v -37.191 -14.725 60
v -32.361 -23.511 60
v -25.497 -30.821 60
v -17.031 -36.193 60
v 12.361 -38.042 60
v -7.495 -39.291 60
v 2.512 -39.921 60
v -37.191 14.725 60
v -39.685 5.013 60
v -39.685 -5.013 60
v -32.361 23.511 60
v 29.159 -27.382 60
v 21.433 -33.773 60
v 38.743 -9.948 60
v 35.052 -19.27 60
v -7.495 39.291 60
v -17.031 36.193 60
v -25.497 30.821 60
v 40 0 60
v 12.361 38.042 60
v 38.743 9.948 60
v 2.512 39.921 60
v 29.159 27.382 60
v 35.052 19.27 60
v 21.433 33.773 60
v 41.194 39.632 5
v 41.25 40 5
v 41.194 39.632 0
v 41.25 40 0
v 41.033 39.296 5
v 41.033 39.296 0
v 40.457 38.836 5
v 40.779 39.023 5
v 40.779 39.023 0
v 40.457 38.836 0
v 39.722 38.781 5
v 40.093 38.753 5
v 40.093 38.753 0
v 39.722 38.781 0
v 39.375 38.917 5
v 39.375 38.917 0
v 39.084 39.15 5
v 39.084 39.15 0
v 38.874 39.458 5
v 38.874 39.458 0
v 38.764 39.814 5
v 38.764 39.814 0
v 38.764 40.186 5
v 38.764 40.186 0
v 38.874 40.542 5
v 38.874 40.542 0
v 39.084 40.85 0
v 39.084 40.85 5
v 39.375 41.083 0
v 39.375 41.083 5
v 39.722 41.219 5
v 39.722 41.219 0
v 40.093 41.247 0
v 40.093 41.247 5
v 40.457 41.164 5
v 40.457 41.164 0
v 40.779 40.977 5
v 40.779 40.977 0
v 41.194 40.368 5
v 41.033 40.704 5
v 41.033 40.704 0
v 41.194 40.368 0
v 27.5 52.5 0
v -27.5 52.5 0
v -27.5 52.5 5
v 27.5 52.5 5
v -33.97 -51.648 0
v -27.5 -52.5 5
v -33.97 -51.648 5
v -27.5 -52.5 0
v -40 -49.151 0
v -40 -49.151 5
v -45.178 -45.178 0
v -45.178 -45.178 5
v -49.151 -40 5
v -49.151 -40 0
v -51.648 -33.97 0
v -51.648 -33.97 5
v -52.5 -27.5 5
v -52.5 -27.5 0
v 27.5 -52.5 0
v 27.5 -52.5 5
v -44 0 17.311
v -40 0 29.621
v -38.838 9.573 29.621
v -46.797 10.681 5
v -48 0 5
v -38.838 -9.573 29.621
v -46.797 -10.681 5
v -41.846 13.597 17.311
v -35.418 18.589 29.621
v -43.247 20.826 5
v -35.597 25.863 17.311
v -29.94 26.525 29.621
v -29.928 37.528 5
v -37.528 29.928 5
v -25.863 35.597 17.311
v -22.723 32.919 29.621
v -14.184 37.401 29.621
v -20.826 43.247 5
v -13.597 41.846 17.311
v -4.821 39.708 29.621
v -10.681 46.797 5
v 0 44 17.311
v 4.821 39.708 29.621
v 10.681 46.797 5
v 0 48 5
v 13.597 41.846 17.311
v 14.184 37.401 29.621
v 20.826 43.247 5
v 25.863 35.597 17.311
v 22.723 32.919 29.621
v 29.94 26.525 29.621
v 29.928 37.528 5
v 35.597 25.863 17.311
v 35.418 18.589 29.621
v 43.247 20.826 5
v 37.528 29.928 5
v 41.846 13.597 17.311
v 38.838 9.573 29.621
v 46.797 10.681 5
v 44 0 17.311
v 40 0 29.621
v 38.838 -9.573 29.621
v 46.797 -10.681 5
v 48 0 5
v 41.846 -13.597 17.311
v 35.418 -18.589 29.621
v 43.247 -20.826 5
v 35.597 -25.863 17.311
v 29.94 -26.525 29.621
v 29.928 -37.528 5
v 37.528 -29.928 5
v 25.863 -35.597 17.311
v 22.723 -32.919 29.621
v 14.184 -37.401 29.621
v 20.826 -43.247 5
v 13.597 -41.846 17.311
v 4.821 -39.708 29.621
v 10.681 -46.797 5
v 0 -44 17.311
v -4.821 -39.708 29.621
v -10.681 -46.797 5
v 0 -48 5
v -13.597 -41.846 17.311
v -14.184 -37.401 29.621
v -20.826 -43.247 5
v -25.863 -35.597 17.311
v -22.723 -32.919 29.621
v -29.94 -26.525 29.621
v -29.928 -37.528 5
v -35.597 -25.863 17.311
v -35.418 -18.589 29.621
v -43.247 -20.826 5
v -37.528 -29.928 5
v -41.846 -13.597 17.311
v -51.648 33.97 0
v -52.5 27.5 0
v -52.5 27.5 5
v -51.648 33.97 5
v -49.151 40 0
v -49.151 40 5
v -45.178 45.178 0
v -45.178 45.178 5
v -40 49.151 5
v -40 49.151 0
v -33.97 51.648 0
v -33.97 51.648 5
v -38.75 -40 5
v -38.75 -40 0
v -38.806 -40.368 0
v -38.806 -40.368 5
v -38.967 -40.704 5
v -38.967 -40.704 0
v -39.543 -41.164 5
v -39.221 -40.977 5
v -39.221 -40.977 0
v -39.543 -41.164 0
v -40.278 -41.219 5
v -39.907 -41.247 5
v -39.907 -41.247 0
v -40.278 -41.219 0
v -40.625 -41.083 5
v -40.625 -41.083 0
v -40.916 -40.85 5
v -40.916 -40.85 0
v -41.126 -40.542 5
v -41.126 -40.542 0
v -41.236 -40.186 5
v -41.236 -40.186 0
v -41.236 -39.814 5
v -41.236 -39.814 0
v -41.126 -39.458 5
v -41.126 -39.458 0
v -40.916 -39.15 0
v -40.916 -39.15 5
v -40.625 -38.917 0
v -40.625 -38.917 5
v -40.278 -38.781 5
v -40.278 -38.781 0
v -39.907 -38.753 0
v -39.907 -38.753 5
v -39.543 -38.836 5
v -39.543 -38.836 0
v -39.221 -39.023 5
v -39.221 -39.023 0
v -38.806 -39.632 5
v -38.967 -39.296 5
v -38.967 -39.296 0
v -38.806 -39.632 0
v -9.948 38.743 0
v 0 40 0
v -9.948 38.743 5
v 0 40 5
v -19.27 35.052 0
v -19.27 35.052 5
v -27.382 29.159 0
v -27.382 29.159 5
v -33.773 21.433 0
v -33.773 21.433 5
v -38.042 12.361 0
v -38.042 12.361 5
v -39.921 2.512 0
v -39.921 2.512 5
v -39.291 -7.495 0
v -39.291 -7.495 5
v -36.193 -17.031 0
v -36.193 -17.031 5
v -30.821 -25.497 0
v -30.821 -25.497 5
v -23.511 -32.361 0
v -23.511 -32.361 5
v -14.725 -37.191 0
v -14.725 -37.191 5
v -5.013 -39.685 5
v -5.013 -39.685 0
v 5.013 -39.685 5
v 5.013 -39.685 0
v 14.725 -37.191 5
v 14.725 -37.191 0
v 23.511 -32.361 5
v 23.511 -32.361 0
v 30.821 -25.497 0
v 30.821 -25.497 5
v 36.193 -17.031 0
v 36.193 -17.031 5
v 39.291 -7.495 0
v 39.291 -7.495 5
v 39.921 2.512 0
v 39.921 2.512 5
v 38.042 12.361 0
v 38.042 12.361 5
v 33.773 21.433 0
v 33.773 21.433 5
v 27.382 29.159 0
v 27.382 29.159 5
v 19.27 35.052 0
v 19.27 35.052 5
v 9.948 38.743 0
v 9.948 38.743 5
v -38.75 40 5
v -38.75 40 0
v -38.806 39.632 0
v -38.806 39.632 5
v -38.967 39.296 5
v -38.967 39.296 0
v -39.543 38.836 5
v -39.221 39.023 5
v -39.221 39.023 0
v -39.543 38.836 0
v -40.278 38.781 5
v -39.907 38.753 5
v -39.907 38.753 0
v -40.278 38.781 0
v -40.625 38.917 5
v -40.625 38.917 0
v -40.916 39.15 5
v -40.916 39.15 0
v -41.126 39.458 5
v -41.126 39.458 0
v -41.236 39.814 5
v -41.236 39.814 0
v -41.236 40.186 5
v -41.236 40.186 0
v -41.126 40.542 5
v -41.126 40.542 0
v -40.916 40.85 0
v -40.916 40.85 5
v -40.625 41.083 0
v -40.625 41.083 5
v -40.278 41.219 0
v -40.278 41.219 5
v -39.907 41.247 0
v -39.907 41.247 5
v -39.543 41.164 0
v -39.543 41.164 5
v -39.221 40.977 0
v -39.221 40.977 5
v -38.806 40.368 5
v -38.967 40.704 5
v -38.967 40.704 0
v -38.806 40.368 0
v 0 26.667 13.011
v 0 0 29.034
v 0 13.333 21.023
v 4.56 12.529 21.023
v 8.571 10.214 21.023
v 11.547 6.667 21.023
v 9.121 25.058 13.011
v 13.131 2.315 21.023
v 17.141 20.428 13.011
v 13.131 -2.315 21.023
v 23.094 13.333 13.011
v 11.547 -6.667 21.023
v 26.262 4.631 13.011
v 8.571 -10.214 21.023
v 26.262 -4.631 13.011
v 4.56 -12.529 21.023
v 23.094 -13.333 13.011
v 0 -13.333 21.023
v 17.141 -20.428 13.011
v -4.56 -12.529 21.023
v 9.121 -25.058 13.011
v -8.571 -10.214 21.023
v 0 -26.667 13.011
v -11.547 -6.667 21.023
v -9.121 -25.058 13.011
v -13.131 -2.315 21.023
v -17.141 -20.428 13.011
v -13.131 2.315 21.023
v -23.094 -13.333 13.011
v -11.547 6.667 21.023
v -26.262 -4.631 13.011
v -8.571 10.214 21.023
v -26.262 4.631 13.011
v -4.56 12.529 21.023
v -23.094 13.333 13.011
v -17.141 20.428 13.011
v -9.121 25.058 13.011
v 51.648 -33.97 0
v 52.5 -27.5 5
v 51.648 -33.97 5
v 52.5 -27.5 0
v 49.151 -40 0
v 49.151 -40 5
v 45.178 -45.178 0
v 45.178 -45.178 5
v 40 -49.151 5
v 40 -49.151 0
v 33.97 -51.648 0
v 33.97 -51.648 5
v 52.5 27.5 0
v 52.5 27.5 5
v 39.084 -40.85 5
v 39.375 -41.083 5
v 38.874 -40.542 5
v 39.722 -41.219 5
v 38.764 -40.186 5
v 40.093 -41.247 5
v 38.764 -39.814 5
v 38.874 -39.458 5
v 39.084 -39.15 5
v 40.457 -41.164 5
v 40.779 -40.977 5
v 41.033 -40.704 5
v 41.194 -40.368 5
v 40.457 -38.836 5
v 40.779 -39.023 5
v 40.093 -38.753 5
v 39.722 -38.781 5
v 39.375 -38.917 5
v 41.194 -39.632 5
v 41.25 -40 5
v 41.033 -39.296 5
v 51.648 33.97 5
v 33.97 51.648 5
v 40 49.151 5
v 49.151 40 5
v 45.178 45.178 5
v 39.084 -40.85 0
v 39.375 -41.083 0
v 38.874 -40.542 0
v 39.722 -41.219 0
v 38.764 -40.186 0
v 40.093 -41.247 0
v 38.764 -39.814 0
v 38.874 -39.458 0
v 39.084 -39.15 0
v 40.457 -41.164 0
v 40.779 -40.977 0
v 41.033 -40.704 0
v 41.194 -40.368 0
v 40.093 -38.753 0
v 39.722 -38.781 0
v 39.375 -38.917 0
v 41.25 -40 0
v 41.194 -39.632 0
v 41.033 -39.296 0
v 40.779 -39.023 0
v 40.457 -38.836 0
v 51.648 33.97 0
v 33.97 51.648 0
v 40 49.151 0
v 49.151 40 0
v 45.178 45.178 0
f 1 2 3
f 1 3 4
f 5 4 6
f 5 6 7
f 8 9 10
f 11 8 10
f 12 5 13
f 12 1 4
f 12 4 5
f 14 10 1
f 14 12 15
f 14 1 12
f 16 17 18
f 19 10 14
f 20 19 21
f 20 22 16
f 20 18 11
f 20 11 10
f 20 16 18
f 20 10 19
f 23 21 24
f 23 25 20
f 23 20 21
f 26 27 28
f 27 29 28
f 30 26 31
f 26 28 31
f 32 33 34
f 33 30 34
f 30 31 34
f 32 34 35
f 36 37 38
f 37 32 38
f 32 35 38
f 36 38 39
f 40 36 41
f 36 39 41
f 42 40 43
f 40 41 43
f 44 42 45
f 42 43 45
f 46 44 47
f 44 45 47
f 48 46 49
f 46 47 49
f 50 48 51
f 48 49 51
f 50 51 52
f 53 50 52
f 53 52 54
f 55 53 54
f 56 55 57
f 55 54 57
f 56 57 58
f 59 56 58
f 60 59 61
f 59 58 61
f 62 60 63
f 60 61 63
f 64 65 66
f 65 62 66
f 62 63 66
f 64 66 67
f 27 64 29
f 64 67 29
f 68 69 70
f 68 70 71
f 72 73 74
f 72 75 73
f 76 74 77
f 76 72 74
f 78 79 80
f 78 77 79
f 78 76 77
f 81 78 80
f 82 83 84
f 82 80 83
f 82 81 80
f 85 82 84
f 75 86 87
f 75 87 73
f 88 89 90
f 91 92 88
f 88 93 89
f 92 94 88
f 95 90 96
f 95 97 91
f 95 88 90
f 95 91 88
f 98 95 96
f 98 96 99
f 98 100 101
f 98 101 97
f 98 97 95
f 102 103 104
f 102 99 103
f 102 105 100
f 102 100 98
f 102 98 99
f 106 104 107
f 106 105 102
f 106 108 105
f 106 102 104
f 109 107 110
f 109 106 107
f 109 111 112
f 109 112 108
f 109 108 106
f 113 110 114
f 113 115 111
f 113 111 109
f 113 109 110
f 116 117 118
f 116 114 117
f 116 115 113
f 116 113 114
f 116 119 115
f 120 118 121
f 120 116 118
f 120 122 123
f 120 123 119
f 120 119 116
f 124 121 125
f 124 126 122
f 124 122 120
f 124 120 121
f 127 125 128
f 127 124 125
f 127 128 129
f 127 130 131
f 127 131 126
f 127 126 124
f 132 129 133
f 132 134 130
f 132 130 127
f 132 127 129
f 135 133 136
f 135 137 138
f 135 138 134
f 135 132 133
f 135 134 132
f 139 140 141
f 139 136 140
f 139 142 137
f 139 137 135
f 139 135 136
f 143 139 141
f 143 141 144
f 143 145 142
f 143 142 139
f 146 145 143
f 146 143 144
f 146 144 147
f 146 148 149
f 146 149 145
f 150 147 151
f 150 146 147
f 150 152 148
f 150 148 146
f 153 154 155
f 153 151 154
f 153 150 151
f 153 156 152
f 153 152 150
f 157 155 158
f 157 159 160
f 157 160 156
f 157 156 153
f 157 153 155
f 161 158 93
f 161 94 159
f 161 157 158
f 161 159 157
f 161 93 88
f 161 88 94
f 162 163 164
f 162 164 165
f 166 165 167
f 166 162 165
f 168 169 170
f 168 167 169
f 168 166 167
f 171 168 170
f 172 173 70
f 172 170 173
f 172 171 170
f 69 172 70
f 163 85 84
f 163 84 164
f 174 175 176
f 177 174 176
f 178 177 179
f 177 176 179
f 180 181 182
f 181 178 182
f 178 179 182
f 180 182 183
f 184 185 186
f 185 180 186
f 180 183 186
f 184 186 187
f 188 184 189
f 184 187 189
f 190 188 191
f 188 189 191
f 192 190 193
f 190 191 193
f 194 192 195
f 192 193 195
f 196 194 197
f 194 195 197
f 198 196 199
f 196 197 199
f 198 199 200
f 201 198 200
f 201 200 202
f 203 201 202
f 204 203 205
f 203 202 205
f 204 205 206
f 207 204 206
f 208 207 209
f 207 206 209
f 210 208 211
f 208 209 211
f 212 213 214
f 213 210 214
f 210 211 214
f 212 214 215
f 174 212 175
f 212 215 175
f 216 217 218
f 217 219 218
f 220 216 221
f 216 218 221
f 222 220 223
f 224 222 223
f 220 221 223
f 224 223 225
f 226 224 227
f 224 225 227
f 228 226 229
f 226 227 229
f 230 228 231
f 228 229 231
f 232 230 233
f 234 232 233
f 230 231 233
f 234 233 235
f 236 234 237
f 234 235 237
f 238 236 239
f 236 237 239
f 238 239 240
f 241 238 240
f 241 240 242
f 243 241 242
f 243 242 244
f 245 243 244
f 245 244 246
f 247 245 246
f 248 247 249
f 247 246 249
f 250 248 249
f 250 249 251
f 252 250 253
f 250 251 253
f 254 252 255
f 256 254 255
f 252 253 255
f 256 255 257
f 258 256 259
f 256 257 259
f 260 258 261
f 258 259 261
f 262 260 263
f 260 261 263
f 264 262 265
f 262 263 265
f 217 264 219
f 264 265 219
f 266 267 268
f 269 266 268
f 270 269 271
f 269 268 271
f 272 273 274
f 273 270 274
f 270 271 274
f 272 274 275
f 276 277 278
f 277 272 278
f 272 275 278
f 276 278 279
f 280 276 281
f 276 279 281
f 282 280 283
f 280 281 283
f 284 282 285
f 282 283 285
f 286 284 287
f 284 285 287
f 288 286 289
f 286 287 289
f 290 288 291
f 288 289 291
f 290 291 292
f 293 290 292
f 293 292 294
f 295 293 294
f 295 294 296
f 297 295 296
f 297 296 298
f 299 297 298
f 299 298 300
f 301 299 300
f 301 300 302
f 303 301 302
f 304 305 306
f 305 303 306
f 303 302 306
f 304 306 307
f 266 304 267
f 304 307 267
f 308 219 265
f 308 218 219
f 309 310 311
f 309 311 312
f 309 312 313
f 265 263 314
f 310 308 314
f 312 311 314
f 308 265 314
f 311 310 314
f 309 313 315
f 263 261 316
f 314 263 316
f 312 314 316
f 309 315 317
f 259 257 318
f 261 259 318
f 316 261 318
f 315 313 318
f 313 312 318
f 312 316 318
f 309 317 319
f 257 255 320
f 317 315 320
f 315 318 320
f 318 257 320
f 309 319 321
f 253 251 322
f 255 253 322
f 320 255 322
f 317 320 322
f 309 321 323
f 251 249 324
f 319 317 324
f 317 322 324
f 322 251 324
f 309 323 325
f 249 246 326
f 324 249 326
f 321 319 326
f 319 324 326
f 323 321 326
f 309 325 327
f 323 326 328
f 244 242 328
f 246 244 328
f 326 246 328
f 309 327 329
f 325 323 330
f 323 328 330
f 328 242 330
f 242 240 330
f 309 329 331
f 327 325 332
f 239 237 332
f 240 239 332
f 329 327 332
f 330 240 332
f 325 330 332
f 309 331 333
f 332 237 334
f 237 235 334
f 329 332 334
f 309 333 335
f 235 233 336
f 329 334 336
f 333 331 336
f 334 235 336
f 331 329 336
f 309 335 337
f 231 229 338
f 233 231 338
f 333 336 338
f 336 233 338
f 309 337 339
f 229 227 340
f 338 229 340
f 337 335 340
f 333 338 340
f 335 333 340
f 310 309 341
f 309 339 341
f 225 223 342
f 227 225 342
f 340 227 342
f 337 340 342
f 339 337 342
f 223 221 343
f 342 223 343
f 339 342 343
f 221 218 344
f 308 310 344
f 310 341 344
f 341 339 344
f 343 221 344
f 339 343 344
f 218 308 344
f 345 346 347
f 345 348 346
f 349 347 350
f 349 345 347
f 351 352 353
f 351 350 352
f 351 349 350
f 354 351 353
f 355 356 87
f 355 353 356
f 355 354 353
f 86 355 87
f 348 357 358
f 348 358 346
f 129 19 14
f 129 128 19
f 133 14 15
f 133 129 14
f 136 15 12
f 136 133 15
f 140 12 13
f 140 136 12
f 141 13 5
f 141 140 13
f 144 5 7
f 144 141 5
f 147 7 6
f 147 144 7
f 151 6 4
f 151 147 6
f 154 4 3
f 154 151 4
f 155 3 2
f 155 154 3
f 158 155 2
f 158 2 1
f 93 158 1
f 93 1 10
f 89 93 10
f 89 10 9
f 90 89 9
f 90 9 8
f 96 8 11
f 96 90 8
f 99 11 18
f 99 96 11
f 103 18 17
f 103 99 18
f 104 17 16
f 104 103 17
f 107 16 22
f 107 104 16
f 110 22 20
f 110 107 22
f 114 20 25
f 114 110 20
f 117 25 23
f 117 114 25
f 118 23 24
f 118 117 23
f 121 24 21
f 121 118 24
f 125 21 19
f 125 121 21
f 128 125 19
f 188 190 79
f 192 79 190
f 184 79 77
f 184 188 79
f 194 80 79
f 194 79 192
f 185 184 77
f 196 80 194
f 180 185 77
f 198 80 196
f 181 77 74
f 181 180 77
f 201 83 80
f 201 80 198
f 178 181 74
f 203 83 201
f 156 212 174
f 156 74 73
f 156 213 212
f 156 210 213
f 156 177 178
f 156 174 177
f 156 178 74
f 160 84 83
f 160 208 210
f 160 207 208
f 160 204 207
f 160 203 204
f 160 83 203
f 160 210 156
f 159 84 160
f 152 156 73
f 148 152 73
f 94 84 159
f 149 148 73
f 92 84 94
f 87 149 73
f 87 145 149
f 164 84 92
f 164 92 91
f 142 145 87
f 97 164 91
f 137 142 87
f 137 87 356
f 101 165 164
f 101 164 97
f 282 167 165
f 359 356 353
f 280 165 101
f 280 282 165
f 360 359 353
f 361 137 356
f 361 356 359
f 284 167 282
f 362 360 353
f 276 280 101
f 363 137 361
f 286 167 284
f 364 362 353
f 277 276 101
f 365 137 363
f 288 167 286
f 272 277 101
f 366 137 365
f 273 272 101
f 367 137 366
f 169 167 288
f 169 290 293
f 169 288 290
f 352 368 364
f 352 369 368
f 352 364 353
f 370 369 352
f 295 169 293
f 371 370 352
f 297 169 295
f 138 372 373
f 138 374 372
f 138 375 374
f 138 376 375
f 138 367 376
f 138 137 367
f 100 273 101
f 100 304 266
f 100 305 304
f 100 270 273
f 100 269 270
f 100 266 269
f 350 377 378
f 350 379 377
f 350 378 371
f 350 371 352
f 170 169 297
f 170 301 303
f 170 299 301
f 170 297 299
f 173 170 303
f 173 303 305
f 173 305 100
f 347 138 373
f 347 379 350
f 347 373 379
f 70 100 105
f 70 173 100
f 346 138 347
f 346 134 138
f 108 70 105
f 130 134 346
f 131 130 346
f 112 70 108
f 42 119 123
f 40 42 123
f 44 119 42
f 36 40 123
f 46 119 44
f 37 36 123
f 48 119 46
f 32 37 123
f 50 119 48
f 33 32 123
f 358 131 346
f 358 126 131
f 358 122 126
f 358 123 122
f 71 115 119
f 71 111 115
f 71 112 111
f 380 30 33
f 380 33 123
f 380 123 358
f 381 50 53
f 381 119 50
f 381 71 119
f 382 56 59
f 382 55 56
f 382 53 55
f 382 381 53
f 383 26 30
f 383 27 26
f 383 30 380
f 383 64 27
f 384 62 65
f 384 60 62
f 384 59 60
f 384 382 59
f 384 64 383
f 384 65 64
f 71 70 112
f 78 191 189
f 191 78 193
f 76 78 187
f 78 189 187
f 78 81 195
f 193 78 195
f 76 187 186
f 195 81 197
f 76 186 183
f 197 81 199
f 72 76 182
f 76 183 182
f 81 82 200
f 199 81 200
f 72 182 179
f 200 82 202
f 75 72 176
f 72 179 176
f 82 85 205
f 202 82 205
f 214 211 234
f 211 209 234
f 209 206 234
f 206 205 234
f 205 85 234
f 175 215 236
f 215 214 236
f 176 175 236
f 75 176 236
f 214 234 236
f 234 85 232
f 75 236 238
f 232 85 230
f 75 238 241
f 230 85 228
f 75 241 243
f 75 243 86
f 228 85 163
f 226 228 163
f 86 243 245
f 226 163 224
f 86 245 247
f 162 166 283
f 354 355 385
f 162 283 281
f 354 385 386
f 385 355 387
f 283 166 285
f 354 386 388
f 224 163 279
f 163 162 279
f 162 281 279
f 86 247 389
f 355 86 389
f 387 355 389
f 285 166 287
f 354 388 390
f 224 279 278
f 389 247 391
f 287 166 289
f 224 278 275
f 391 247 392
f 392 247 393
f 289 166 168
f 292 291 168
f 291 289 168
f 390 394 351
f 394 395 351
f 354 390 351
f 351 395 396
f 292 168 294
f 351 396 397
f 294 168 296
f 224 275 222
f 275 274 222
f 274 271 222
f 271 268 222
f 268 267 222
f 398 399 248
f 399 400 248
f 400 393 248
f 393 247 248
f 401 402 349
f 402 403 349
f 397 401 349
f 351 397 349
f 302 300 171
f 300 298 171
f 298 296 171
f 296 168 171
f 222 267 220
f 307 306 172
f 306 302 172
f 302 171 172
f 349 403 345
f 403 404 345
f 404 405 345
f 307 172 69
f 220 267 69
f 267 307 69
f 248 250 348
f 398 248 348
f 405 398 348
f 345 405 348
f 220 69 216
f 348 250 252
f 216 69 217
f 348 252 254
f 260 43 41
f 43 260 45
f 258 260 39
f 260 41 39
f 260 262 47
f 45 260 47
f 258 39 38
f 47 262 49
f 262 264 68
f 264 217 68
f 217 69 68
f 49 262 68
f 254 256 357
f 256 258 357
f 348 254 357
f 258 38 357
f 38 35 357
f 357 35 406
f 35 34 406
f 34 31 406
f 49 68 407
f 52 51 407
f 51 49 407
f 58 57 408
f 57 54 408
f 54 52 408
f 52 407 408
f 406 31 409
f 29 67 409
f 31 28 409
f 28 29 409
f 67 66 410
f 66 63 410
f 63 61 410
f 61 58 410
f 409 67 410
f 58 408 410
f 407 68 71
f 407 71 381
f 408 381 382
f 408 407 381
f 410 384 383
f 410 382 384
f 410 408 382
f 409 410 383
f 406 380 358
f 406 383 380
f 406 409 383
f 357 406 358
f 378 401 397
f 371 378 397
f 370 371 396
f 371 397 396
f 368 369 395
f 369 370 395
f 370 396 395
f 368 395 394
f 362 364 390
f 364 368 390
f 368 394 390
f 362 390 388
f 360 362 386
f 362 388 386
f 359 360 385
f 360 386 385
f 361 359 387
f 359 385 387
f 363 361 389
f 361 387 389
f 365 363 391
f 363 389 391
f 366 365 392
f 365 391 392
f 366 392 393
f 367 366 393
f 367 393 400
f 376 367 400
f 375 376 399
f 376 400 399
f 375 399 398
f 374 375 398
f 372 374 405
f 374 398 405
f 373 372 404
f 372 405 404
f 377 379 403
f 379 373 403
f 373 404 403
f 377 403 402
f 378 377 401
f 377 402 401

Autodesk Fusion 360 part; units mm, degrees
sketch "Esquisse1" plane through (0, 0, 0) normal (0, 0, 1) x (1, 0, 0)
  line L0 (27.5, -52.5) -> (-27.5, -52.5)
  line L1 (-52.5, -27.5) -> (-52.5, 27.5)
  line L2 (-27.5, 52.5) -> (27.5, 52.5)
  line L3 (52.5, 27.5) -> (52.5, -27.5)
  circle A0 centre (0, 0) radius 52.5
  line L4 (40, -40) -> (-40, 40) construction
  line L5 (-40, -40) -> (40, 40) construction
  circle A1 centre (-40, -40) radius 1.25
  circle A2 centre (40, -40) radius 1.25
  circle A3 centre (-40, 40) radius 1.25
  circle A4 centre (40, 40) radius 1.25
  arc A5 (-52.5, -27.5) -> (-27.5, -52.5) centre (-27.5, -27.5) ccw
  arc A6 (27.5, -52.5) -> (52.5, -27.5) centre (27.5, -27.5) ccw
  arc A7 (52.5, 27.5) -> (27.5, 52.5) centre (27.5, 27.5) ccw
  arc A8 (-27.5, 52.5) -> (-52.5, 27.5) centre (-27.5, 27.5) ccw
  dimension "d3" = 105
  dimension "d40" = 2.5
  dimension "d41" = 2.5
  dimension "d42" = 2.5
  dimension "d43" = 2.5
extrude "Extrusion1" add sketch "Esquisse1" along normal blind 5 contours L0 L3 A0 A6 | L0 L1 A0 A5 | A0 | L1 L2 A0 A8 | L2 L3 A0 A7 | A1 | A2 | A3 | A4
sketch "Esquisse2" plane through (0, 0, 5) normal (0, 0, 1) x (-1, 0, 0)
  line L0 (-27.5, -52.5) -> (27.5, -52.5)
  line L1 (52.5, -27.5) -> (52.5, 27.5)
  line L2 (27.5, 52.5) -> (-27.5, 52.5)
  line L3 (-52.5, 27.5) -> (-52.5, -27.5)
  circle A0 centre (0, 0) radius 48
  arc A1 (-52.5, -27.5) -> (-27.5, -52.5) centre (-27.5, -27.5) ccw
  arc A2 (27.5, -52.5) -> (52.5, -27.5) centre (27.5, -27.5) ccw
  arc A3 (52.5, 27.5) -> (27.5, 52.5) centre (27.5, 27.5) ccw
  arc A4 (-27.5, 52.5) -> (-52.5, 27.5) centre (-27.5, 27.5) ccw
  dimension "d16" = 96
extrude "Extrusion2" add sketch "Esquisse2" along normal blind 25 draft -18 contours A0
hole "Perçage2" at (0, 0, 0) direction (0, 0, 1) diameter 80 depth 60 tip angle 180
sketch "Esquisse5" plane through (0, 0, 0) normal (1, 0, 0) x (0, 1, 0)
sketch "Esquisse6" plane through (0, 0, 0) normal (0, 0, 1) x (1, 0, 0)
  circle A0 centre (0, 0) radius 40
  dimension "d28" = 80
extrude "Extrusion4" add sketch "Esquisse6" along normal blind 60
hole "Perçage3" at (0, 0, 0) direction (0, 0, 1) diameter 80 depth 5 tip angle 118
extrude "Extrusion6" cut sketch "Esquisse1" along normal blind 5 contours A1 | A2 | A3 | A4
